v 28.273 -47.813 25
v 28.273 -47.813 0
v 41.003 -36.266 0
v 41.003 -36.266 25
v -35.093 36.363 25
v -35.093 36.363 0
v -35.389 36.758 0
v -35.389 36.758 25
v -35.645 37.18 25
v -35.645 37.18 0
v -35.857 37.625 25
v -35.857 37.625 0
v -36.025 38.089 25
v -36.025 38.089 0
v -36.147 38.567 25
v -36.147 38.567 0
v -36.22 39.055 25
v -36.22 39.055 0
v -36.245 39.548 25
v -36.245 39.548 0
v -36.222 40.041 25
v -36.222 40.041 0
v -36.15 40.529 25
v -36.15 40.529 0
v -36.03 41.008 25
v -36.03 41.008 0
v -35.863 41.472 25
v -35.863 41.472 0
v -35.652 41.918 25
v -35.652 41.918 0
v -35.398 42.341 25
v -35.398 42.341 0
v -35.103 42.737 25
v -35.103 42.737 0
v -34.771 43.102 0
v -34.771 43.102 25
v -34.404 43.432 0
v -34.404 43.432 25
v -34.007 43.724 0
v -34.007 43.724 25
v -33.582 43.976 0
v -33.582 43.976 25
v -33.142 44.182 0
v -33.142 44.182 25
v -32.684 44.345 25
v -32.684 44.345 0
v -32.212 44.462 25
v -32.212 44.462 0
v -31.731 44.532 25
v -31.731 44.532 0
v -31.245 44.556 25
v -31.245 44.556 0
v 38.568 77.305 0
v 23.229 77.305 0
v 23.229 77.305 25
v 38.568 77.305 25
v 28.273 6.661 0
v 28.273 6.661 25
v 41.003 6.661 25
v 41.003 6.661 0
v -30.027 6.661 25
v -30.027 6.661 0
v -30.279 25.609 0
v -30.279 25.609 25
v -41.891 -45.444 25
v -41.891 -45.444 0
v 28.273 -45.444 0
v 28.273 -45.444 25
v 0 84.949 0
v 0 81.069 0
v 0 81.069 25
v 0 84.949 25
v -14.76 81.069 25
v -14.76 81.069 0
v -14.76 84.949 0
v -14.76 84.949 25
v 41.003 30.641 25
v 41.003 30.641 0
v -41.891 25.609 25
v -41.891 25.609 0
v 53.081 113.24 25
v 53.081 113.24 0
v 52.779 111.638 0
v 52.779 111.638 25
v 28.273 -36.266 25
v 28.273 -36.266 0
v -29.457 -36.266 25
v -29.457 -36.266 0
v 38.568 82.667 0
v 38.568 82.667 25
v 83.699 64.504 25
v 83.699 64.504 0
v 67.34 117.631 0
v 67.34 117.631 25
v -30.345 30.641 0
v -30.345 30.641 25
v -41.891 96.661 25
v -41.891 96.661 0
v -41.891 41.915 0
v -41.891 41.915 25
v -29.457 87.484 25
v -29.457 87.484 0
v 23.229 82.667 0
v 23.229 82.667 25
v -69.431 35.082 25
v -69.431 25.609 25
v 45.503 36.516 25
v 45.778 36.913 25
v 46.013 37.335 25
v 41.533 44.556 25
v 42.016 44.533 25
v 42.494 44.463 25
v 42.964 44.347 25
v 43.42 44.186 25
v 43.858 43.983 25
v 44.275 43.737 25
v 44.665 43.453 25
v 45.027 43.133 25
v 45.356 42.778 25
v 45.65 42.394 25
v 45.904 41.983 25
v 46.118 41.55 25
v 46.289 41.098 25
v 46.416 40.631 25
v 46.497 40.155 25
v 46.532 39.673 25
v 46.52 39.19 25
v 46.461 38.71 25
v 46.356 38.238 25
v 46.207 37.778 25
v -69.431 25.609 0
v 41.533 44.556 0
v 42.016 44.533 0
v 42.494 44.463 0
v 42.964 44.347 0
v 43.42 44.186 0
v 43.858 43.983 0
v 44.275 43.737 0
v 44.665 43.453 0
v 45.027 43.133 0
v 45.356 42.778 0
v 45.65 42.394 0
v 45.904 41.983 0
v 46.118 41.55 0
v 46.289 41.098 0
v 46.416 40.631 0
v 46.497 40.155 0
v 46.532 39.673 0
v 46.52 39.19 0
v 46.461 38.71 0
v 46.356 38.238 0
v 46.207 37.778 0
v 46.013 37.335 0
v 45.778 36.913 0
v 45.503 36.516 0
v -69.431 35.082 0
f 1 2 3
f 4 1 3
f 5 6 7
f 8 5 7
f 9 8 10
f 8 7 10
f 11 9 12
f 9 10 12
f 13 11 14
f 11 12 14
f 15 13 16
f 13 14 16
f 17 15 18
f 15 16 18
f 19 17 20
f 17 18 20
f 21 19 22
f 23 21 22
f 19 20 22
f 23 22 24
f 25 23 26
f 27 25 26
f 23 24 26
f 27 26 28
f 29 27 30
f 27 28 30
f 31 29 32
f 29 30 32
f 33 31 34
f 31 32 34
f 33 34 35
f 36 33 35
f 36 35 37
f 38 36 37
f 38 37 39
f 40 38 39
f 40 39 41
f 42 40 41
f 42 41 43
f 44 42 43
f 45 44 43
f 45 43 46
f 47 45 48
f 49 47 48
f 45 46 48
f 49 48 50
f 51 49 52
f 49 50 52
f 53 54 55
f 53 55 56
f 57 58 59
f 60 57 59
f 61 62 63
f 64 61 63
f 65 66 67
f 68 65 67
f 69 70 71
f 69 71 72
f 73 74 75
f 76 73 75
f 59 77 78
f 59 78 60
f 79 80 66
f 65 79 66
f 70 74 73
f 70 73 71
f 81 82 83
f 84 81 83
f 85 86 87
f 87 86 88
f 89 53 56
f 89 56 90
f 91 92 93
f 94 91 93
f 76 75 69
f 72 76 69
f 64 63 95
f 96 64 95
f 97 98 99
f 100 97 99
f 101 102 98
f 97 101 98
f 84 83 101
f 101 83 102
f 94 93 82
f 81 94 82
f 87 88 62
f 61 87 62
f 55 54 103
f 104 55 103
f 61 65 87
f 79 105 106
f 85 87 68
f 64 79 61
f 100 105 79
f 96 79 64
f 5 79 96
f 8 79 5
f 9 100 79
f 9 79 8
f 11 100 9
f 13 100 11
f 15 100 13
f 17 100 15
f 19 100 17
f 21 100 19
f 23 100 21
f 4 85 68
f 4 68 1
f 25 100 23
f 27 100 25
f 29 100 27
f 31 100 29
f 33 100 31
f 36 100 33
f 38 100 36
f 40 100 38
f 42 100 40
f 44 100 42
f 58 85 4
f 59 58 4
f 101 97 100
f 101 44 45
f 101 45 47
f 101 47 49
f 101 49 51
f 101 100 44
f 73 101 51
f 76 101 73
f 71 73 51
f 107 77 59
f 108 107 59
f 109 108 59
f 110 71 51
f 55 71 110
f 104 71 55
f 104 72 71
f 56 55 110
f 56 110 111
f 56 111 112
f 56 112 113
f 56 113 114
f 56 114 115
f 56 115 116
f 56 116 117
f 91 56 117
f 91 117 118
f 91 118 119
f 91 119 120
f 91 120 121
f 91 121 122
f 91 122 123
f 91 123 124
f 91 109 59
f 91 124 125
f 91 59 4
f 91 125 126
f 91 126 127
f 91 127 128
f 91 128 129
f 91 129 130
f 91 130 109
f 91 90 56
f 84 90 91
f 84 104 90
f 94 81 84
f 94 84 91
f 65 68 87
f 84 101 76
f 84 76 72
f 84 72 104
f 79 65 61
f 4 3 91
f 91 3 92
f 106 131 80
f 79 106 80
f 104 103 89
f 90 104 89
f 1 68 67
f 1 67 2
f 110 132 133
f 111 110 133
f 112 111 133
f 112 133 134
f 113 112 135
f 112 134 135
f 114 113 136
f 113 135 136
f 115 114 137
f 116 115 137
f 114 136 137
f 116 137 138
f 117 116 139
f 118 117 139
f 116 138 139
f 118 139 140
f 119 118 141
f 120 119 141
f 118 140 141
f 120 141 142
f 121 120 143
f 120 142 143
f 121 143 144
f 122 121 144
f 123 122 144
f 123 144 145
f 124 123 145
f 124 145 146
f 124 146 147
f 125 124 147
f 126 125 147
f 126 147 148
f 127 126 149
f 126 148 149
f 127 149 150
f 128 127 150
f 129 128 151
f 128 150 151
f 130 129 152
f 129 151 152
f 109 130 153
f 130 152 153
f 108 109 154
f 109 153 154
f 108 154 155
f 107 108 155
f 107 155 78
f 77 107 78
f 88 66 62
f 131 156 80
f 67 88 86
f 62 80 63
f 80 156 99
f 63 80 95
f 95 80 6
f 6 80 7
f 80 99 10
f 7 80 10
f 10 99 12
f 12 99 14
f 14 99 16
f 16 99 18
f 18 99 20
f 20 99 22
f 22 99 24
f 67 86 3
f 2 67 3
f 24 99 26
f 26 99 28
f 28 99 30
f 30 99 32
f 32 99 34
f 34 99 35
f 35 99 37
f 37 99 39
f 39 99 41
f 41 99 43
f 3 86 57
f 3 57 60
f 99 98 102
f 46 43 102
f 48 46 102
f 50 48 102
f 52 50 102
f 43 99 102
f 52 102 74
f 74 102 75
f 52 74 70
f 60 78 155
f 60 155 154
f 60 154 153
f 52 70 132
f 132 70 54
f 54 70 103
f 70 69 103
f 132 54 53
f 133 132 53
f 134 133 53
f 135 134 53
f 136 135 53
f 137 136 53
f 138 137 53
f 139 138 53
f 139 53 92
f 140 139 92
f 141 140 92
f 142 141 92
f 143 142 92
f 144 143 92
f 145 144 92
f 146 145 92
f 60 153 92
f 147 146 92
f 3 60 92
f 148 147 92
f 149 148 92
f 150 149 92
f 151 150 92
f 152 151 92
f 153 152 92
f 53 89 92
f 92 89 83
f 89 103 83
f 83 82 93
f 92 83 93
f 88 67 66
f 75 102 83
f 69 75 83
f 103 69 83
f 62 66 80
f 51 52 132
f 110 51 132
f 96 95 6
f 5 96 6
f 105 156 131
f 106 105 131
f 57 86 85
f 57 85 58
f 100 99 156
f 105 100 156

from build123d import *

# Parameters (mm, degrees)
F0_W     = 14.7602576762
F0_H     = 3.8799718022
F0_W_2   = 15.3383538127
F0_H_2   = 5.3616389632
F0_W_3   = 12.7302650362
F0_H_3   = 42.9276376963
F1_DEPTH = 25


with BuildPart() as f1:
    # F0 (on Top) → F1 (new body)
    with BuildSketch(Plane.XY):
        with BuildLine():
            Line((-41.8914481997, 25.6085544825), (-30.3453952074, 30.6414496154))
            Line((-30.3453952074, 30.6414496154), (-35.0931140335, 36.3630584026))
            ThreePointArc((-35.0931140335, 36.3630584026), (-36.1496783198, 40.5291275429), (-33.5824096079, 43.9760959986))
            Line((-33.5824096079, 43.9760959986), (-41.8914481997, 41.9146602538))
            Line((-41.8914481997, 41.9146602538), (-41.8914481997, 25.6085544825))
        make_face()
        Polygon((-30.2785868891, 25.6085544824), (-30.3453952074, 30.6414496154), (-41.8914481997, 25.6085544825), align=None)
        Polygon((-30.0270732639, 6.6611878574), (-30.2785868891, 25.6085544824), (-41.8914481997, 25.6085544825), (-41.8914481997, -45.4440824687), (-29.4572375715, -36.2664498389), align=None)
        Polygon((-69.4309175014, 25.6085544825), (-41.8914481997, 25.6085544825), (-41.8914481997, 41.9146602538), (-69.4309175014, 35.0822396576), align=None)
        Polygon((-29.4572375715, 87.4835588038), (-30.0270732639, 44.5559211075), (38.9467375503, 44.5559211075), align=None)
        with BuildLine():
            Line((-31.2453058591, 44.5559211075), (-30.0270732639, 44.5559211075))
            Line((-30.0270732639, 44.5559211075), (-29.4572375715, 87.4835588038))
            Line((-29.4572375715, 87.4835588038), (-41.8914481997, 96.6611914337))
            Line((-41.8914481997, 96.6611914337), (-41.8914481997, 41.9146602538))
            Line((-41.8914481997, 41.9146602538), (-33.5824096079, 43.9760959986))
            ThreePointArc((-33.5824096079, 43.9760959986), (-32.4492837544, 44.4088003794), (-31.2453058591, 44.5559211075))
        make_face()
        Polygon((-29.4572375715, -36.2664498389), (-41.8914481997, -45.4440824687), (28.2730255276, -45.4440824687), (28.2730255276, -36.2664498389), align=None)
        with BuildLine():
            Line((45.5025919776, 36.5155363053), (41.0032905638, 30.6414496154))
            Line((41.0032905638, 30.6414496154), (41.0032905638, 6.6611878574))
            Line((41.0032905638, 6.6611878574), (41.0032905638, -36.2664498389))
            Line((41.0032905638, -36.2664498389), (83.6994573474, 64.5043104887))
            Line((83.6994573474, 64.5043104887), (67.339964211, 117.6310479641))
            Line((67.339964211, 117.6310479641), (53.0811295514, 113.2402775379))
            Line((53.0811295514, 113.2402775379), (52.7791223524, 111.6383405707))
            Line((52.7791223524, 111.6383405707), (40.1323241217, 44.5559211075))
            Line((40.1323241217, 44.5559211075), (41.5332015641, 44.5559211075))
            ThreePointArc((41.5332015641, 44.5559211075), (46.0166112047, 41.7692981641), (45.5025919776, 36.5155363053))
        make_face()
        Polygon((-29.4572375715, 87.4835588038), (38.9467375503, 44.5559211075), (40.1323241217, 44.5559211075), (52.7791223524, 111.6383405707), align=None)
        with Locations((-7.3801288381, 83.009172231)):
            Rectangle(F0_W, F0_H, mode=Mode.SUBTRACT)
        with Locations((30.8985039592, 79.9858681858)):
            Rectangle(F0_W_2, F0_H_2, mode=Mode.SUBTRACT)
        with Locations((34.6381580457, -14.8026309907)):
            Rectangle(F0_W_3, F0_H_3)
        Polygon((28.2730255276, -36.2664498389), (28.2730255276, -45.4440824687), (28.2730255276, -47.8125028312), (41.0032905638, -36.2664498389), align=None)
    extrude(amount=F1_DEPTH)


solid = f1.part
